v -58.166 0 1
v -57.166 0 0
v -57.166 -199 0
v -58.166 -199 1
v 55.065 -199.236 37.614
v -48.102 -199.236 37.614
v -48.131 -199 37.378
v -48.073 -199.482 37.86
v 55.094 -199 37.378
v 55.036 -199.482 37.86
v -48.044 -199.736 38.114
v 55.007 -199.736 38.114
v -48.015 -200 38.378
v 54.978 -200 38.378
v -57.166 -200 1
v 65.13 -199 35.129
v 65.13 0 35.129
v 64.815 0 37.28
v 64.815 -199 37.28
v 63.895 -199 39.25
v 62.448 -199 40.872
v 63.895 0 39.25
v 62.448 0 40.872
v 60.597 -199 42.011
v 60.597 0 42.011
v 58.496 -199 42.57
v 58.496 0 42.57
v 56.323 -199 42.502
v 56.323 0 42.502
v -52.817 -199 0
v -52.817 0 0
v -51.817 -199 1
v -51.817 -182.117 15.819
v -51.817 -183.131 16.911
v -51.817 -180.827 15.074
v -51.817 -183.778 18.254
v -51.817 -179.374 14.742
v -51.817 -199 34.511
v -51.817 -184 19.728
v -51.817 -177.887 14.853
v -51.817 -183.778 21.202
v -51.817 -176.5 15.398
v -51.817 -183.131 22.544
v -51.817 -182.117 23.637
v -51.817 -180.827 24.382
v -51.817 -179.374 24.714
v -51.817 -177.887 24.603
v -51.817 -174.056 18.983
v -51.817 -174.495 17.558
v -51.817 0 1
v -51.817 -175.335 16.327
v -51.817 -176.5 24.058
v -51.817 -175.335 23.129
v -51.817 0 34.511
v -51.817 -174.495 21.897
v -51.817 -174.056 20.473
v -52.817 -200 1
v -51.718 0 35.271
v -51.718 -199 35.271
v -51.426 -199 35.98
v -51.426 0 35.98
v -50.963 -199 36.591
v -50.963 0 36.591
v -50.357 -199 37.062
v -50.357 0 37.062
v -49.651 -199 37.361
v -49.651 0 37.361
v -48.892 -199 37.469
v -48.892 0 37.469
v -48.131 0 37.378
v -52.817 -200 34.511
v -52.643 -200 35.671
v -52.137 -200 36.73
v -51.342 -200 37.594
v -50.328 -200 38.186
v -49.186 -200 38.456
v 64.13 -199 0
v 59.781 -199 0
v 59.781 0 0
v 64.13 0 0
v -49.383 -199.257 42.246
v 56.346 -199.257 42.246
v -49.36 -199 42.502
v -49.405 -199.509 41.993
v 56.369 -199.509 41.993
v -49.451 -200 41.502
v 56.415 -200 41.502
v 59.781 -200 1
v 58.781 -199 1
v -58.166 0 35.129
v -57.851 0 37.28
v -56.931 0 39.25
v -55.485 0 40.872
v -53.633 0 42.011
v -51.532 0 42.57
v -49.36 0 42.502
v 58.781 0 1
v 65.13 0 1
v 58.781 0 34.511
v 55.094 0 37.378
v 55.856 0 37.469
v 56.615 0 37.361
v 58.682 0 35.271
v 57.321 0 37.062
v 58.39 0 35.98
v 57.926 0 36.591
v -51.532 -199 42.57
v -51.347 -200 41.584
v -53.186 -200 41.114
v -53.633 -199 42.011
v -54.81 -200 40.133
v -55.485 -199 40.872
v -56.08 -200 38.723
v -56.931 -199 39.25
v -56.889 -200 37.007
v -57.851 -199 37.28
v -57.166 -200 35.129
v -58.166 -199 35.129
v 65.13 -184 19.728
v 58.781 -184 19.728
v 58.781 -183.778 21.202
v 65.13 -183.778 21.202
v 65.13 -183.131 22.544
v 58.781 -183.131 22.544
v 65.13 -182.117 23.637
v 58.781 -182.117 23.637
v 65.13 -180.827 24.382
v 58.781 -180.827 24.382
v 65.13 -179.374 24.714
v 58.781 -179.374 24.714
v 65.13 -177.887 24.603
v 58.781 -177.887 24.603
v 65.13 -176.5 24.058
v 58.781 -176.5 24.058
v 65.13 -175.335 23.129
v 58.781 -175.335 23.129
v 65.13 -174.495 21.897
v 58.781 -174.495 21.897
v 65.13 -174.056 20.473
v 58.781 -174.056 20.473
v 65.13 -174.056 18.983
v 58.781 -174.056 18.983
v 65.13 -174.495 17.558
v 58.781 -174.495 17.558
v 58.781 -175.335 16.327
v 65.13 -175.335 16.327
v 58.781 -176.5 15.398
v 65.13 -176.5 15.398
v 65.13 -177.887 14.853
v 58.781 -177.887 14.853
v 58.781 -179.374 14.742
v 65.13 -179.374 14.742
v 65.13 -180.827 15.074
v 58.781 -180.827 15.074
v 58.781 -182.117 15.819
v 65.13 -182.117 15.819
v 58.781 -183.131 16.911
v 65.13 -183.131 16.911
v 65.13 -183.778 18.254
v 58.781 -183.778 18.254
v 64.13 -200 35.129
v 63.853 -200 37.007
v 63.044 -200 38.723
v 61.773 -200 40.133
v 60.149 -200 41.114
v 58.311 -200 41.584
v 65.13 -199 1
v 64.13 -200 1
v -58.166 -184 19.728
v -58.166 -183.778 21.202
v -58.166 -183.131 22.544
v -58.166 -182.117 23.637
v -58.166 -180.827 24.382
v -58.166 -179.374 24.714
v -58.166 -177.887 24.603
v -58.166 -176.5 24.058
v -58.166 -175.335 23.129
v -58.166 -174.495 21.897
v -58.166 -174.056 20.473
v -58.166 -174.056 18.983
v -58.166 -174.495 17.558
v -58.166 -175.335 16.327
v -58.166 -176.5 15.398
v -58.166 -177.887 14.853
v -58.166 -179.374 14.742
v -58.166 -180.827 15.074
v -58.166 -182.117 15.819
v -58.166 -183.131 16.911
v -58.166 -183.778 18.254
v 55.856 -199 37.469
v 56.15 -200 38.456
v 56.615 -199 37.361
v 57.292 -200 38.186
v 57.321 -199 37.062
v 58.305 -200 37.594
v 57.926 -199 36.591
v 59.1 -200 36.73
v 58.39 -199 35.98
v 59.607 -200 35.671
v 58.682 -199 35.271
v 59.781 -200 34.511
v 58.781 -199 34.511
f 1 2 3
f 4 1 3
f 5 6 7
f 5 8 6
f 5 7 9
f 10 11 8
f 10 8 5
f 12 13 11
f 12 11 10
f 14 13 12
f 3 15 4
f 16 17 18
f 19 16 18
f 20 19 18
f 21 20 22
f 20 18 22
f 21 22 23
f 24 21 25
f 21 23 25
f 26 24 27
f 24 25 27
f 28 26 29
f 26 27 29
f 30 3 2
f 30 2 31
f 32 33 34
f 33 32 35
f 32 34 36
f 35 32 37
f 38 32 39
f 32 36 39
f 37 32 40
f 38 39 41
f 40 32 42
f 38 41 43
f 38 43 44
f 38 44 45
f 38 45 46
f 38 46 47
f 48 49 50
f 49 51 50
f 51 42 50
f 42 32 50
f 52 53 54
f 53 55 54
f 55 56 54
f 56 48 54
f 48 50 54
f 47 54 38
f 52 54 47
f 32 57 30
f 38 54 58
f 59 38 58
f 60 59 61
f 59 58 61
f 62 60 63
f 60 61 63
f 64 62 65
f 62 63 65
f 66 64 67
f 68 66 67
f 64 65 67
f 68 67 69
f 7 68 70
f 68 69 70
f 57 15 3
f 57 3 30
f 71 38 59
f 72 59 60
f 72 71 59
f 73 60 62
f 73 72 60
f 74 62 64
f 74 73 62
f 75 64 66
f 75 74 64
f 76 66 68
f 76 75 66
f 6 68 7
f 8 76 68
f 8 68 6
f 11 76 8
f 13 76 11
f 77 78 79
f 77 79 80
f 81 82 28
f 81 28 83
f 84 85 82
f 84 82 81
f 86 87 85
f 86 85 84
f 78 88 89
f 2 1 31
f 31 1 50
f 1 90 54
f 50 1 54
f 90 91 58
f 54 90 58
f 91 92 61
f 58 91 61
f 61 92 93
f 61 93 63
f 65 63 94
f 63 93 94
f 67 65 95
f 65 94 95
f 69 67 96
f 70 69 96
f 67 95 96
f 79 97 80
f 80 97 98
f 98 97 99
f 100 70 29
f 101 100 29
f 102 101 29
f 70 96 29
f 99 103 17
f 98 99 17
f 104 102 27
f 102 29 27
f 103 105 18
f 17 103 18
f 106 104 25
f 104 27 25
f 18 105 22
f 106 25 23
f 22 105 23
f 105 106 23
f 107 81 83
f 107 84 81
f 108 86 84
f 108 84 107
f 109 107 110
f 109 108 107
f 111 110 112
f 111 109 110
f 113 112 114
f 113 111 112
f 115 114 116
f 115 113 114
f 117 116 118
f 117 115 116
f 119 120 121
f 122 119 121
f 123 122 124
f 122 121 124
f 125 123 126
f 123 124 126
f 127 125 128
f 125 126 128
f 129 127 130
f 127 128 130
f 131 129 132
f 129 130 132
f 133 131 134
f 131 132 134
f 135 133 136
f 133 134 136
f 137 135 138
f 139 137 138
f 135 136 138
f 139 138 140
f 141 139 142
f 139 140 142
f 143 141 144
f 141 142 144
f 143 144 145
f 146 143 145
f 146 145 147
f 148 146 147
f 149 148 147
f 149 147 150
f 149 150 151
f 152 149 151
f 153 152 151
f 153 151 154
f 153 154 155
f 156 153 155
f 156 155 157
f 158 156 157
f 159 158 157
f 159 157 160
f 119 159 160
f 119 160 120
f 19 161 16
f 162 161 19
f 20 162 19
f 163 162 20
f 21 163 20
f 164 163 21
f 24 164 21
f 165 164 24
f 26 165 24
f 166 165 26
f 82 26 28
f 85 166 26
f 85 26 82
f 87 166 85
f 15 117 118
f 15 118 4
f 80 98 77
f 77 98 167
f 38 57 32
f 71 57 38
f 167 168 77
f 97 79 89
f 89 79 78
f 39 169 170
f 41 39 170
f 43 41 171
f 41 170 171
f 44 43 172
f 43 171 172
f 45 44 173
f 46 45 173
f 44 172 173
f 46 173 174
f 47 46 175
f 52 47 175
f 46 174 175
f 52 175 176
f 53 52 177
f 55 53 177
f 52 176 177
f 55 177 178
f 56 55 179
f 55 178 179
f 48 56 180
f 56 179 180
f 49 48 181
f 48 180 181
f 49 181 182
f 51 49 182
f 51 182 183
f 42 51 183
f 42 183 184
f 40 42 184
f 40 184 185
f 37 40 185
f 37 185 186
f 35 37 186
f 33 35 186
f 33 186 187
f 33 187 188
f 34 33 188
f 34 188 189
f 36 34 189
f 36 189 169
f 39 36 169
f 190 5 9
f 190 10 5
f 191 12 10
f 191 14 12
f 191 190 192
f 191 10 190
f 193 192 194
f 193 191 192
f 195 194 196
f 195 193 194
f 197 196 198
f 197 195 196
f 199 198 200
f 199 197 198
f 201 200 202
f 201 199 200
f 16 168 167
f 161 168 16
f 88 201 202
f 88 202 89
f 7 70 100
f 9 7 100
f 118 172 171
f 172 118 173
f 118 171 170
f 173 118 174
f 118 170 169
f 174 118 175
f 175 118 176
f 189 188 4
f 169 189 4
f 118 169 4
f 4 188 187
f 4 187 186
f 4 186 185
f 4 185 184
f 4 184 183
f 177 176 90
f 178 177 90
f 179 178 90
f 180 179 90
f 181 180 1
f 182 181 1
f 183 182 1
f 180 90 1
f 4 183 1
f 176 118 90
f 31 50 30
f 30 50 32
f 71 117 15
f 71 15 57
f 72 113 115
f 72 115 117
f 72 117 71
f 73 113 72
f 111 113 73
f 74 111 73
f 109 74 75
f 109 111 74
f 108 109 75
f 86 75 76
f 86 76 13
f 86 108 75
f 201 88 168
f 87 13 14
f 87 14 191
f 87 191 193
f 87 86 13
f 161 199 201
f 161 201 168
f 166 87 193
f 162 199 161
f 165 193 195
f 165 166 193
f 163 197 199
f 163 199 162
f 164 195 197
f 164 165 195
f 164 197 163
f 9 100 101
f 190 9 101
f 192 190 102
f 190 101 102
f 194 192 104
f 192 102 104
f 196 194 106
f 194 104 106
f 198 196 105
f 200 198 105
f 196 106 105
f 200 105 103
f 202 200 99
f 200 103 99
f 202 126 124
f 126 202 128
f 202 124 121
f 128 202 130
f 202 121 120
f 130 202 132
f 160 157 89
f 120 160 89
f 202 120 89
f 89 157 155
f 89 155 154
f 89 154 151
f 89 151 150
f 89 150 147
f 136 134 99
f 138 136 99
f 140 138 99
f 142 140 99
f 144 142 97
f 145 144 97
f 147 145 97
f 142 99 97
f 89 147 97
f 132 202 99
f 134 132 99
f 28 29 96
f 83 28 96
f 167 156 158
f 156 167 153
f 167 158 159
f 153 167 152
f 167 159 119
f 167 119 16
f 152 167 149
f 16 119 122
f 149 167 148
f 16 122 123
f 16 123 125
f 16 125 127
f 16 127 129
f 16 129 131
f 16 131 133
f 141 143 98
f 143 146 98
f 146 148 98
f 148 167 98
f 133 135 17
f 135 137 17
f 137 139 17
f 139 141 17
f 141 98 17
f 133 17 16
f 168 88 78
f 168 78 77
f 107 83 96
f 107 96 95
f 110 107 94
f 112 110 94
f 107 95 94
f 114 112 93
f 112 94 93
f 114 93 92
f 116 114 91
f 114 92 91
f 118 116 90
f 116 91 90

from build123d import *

# Parameters (mm, degrees)
F1_DEPTH = 200
F2_SIZE  = 1
F3_R     = 5
F4_DEPTH = 123.2975


with BuildPart() as f1:
    # F0 (on Front) → F1 (new body)
    with BuildSketch(Plane.XZ):
        with BuildLine():
            Line((56.323145, 42.502471), (3.481794, 42.502471))
            Line((3.481794, 42.502471), (-49.359557, 42.502471))
            ThreePointArc((-49.359557, 42.502471), (-55.484592, 40.872204), (-58.166456, 35.129257))
            Line((-58.166456, 35.129257), (-58.166456, 0))
            Line((-58.166456, 0), (-51.817301, 0))
            Line((-51.817301, 0), (-51.817301, 34.510728))
            ThreePointArc((-51.817301, 34.510728), (-50.675188, 36.845939), (-48.130694, 37.378091))
            Line((-48.130694, 37.378091), (3.481794, 37.378091))
            Line((3.481794, 37.378091), (55.094283, 37.378091))
            ThreePointArc((55.094283, 37.378091), (57.638777, 36.845939), (58.78089, 34.510728))
            Line((58.78089, 34.510728), (58.78089, 0))
            Line((58.78089, 0), (65.130044, 0))
            Line((65.130044, 0), (65.130044, 35.129257))
            ThreePointArc((65.130044, 35.129257), (62.448181, 40.872204), (56.323145, 42.502471))
        make_face()
    extrude(amount=F1_DEPTH)

    # F2
    f2_edges = [f1.edges().sort_by_distance(p)[0] for p in [
        (3.481794, -200, 42.502471),
        (3.481794, -200, 37.378091),
        (-55.484592, -200, 40.872204),
        (-50.675188, -200, 36.845939),
        (-51.817301, -200, 17.255364),
        (-58.166456, -200, 17.564629),
        (-54.991878, -200, 0),
        (58.78089, -200, 17.255364),
        (57.638777, -200, 36.845939),
        (62.448181, -200, 40.872204),
        (65.130044, -200, 17.564629),
        (61.955467, -200, 0),
        (58.78089, -100, 0),
        (65.130044, -100, 0),
        (-51.817301, -100, 0),
        (-58.166456, -100, 0),
    ]]
    chamfer(f2_edges, length=F2_SIZE)

    # F3 (on face) → F4 (cut, through all)
    with BuildSketch(Plane(origin=(-58.166456, 0, 0), x_dir=(0, -1, 0), z_dir=(-1, 0, 0))):
        with Locations((179, 19.727895)):
            Circle(F3_R)
    extrude(amount=-F4_DEPTH, mode=Mode.SUBTRACT)


solid = f1.part
